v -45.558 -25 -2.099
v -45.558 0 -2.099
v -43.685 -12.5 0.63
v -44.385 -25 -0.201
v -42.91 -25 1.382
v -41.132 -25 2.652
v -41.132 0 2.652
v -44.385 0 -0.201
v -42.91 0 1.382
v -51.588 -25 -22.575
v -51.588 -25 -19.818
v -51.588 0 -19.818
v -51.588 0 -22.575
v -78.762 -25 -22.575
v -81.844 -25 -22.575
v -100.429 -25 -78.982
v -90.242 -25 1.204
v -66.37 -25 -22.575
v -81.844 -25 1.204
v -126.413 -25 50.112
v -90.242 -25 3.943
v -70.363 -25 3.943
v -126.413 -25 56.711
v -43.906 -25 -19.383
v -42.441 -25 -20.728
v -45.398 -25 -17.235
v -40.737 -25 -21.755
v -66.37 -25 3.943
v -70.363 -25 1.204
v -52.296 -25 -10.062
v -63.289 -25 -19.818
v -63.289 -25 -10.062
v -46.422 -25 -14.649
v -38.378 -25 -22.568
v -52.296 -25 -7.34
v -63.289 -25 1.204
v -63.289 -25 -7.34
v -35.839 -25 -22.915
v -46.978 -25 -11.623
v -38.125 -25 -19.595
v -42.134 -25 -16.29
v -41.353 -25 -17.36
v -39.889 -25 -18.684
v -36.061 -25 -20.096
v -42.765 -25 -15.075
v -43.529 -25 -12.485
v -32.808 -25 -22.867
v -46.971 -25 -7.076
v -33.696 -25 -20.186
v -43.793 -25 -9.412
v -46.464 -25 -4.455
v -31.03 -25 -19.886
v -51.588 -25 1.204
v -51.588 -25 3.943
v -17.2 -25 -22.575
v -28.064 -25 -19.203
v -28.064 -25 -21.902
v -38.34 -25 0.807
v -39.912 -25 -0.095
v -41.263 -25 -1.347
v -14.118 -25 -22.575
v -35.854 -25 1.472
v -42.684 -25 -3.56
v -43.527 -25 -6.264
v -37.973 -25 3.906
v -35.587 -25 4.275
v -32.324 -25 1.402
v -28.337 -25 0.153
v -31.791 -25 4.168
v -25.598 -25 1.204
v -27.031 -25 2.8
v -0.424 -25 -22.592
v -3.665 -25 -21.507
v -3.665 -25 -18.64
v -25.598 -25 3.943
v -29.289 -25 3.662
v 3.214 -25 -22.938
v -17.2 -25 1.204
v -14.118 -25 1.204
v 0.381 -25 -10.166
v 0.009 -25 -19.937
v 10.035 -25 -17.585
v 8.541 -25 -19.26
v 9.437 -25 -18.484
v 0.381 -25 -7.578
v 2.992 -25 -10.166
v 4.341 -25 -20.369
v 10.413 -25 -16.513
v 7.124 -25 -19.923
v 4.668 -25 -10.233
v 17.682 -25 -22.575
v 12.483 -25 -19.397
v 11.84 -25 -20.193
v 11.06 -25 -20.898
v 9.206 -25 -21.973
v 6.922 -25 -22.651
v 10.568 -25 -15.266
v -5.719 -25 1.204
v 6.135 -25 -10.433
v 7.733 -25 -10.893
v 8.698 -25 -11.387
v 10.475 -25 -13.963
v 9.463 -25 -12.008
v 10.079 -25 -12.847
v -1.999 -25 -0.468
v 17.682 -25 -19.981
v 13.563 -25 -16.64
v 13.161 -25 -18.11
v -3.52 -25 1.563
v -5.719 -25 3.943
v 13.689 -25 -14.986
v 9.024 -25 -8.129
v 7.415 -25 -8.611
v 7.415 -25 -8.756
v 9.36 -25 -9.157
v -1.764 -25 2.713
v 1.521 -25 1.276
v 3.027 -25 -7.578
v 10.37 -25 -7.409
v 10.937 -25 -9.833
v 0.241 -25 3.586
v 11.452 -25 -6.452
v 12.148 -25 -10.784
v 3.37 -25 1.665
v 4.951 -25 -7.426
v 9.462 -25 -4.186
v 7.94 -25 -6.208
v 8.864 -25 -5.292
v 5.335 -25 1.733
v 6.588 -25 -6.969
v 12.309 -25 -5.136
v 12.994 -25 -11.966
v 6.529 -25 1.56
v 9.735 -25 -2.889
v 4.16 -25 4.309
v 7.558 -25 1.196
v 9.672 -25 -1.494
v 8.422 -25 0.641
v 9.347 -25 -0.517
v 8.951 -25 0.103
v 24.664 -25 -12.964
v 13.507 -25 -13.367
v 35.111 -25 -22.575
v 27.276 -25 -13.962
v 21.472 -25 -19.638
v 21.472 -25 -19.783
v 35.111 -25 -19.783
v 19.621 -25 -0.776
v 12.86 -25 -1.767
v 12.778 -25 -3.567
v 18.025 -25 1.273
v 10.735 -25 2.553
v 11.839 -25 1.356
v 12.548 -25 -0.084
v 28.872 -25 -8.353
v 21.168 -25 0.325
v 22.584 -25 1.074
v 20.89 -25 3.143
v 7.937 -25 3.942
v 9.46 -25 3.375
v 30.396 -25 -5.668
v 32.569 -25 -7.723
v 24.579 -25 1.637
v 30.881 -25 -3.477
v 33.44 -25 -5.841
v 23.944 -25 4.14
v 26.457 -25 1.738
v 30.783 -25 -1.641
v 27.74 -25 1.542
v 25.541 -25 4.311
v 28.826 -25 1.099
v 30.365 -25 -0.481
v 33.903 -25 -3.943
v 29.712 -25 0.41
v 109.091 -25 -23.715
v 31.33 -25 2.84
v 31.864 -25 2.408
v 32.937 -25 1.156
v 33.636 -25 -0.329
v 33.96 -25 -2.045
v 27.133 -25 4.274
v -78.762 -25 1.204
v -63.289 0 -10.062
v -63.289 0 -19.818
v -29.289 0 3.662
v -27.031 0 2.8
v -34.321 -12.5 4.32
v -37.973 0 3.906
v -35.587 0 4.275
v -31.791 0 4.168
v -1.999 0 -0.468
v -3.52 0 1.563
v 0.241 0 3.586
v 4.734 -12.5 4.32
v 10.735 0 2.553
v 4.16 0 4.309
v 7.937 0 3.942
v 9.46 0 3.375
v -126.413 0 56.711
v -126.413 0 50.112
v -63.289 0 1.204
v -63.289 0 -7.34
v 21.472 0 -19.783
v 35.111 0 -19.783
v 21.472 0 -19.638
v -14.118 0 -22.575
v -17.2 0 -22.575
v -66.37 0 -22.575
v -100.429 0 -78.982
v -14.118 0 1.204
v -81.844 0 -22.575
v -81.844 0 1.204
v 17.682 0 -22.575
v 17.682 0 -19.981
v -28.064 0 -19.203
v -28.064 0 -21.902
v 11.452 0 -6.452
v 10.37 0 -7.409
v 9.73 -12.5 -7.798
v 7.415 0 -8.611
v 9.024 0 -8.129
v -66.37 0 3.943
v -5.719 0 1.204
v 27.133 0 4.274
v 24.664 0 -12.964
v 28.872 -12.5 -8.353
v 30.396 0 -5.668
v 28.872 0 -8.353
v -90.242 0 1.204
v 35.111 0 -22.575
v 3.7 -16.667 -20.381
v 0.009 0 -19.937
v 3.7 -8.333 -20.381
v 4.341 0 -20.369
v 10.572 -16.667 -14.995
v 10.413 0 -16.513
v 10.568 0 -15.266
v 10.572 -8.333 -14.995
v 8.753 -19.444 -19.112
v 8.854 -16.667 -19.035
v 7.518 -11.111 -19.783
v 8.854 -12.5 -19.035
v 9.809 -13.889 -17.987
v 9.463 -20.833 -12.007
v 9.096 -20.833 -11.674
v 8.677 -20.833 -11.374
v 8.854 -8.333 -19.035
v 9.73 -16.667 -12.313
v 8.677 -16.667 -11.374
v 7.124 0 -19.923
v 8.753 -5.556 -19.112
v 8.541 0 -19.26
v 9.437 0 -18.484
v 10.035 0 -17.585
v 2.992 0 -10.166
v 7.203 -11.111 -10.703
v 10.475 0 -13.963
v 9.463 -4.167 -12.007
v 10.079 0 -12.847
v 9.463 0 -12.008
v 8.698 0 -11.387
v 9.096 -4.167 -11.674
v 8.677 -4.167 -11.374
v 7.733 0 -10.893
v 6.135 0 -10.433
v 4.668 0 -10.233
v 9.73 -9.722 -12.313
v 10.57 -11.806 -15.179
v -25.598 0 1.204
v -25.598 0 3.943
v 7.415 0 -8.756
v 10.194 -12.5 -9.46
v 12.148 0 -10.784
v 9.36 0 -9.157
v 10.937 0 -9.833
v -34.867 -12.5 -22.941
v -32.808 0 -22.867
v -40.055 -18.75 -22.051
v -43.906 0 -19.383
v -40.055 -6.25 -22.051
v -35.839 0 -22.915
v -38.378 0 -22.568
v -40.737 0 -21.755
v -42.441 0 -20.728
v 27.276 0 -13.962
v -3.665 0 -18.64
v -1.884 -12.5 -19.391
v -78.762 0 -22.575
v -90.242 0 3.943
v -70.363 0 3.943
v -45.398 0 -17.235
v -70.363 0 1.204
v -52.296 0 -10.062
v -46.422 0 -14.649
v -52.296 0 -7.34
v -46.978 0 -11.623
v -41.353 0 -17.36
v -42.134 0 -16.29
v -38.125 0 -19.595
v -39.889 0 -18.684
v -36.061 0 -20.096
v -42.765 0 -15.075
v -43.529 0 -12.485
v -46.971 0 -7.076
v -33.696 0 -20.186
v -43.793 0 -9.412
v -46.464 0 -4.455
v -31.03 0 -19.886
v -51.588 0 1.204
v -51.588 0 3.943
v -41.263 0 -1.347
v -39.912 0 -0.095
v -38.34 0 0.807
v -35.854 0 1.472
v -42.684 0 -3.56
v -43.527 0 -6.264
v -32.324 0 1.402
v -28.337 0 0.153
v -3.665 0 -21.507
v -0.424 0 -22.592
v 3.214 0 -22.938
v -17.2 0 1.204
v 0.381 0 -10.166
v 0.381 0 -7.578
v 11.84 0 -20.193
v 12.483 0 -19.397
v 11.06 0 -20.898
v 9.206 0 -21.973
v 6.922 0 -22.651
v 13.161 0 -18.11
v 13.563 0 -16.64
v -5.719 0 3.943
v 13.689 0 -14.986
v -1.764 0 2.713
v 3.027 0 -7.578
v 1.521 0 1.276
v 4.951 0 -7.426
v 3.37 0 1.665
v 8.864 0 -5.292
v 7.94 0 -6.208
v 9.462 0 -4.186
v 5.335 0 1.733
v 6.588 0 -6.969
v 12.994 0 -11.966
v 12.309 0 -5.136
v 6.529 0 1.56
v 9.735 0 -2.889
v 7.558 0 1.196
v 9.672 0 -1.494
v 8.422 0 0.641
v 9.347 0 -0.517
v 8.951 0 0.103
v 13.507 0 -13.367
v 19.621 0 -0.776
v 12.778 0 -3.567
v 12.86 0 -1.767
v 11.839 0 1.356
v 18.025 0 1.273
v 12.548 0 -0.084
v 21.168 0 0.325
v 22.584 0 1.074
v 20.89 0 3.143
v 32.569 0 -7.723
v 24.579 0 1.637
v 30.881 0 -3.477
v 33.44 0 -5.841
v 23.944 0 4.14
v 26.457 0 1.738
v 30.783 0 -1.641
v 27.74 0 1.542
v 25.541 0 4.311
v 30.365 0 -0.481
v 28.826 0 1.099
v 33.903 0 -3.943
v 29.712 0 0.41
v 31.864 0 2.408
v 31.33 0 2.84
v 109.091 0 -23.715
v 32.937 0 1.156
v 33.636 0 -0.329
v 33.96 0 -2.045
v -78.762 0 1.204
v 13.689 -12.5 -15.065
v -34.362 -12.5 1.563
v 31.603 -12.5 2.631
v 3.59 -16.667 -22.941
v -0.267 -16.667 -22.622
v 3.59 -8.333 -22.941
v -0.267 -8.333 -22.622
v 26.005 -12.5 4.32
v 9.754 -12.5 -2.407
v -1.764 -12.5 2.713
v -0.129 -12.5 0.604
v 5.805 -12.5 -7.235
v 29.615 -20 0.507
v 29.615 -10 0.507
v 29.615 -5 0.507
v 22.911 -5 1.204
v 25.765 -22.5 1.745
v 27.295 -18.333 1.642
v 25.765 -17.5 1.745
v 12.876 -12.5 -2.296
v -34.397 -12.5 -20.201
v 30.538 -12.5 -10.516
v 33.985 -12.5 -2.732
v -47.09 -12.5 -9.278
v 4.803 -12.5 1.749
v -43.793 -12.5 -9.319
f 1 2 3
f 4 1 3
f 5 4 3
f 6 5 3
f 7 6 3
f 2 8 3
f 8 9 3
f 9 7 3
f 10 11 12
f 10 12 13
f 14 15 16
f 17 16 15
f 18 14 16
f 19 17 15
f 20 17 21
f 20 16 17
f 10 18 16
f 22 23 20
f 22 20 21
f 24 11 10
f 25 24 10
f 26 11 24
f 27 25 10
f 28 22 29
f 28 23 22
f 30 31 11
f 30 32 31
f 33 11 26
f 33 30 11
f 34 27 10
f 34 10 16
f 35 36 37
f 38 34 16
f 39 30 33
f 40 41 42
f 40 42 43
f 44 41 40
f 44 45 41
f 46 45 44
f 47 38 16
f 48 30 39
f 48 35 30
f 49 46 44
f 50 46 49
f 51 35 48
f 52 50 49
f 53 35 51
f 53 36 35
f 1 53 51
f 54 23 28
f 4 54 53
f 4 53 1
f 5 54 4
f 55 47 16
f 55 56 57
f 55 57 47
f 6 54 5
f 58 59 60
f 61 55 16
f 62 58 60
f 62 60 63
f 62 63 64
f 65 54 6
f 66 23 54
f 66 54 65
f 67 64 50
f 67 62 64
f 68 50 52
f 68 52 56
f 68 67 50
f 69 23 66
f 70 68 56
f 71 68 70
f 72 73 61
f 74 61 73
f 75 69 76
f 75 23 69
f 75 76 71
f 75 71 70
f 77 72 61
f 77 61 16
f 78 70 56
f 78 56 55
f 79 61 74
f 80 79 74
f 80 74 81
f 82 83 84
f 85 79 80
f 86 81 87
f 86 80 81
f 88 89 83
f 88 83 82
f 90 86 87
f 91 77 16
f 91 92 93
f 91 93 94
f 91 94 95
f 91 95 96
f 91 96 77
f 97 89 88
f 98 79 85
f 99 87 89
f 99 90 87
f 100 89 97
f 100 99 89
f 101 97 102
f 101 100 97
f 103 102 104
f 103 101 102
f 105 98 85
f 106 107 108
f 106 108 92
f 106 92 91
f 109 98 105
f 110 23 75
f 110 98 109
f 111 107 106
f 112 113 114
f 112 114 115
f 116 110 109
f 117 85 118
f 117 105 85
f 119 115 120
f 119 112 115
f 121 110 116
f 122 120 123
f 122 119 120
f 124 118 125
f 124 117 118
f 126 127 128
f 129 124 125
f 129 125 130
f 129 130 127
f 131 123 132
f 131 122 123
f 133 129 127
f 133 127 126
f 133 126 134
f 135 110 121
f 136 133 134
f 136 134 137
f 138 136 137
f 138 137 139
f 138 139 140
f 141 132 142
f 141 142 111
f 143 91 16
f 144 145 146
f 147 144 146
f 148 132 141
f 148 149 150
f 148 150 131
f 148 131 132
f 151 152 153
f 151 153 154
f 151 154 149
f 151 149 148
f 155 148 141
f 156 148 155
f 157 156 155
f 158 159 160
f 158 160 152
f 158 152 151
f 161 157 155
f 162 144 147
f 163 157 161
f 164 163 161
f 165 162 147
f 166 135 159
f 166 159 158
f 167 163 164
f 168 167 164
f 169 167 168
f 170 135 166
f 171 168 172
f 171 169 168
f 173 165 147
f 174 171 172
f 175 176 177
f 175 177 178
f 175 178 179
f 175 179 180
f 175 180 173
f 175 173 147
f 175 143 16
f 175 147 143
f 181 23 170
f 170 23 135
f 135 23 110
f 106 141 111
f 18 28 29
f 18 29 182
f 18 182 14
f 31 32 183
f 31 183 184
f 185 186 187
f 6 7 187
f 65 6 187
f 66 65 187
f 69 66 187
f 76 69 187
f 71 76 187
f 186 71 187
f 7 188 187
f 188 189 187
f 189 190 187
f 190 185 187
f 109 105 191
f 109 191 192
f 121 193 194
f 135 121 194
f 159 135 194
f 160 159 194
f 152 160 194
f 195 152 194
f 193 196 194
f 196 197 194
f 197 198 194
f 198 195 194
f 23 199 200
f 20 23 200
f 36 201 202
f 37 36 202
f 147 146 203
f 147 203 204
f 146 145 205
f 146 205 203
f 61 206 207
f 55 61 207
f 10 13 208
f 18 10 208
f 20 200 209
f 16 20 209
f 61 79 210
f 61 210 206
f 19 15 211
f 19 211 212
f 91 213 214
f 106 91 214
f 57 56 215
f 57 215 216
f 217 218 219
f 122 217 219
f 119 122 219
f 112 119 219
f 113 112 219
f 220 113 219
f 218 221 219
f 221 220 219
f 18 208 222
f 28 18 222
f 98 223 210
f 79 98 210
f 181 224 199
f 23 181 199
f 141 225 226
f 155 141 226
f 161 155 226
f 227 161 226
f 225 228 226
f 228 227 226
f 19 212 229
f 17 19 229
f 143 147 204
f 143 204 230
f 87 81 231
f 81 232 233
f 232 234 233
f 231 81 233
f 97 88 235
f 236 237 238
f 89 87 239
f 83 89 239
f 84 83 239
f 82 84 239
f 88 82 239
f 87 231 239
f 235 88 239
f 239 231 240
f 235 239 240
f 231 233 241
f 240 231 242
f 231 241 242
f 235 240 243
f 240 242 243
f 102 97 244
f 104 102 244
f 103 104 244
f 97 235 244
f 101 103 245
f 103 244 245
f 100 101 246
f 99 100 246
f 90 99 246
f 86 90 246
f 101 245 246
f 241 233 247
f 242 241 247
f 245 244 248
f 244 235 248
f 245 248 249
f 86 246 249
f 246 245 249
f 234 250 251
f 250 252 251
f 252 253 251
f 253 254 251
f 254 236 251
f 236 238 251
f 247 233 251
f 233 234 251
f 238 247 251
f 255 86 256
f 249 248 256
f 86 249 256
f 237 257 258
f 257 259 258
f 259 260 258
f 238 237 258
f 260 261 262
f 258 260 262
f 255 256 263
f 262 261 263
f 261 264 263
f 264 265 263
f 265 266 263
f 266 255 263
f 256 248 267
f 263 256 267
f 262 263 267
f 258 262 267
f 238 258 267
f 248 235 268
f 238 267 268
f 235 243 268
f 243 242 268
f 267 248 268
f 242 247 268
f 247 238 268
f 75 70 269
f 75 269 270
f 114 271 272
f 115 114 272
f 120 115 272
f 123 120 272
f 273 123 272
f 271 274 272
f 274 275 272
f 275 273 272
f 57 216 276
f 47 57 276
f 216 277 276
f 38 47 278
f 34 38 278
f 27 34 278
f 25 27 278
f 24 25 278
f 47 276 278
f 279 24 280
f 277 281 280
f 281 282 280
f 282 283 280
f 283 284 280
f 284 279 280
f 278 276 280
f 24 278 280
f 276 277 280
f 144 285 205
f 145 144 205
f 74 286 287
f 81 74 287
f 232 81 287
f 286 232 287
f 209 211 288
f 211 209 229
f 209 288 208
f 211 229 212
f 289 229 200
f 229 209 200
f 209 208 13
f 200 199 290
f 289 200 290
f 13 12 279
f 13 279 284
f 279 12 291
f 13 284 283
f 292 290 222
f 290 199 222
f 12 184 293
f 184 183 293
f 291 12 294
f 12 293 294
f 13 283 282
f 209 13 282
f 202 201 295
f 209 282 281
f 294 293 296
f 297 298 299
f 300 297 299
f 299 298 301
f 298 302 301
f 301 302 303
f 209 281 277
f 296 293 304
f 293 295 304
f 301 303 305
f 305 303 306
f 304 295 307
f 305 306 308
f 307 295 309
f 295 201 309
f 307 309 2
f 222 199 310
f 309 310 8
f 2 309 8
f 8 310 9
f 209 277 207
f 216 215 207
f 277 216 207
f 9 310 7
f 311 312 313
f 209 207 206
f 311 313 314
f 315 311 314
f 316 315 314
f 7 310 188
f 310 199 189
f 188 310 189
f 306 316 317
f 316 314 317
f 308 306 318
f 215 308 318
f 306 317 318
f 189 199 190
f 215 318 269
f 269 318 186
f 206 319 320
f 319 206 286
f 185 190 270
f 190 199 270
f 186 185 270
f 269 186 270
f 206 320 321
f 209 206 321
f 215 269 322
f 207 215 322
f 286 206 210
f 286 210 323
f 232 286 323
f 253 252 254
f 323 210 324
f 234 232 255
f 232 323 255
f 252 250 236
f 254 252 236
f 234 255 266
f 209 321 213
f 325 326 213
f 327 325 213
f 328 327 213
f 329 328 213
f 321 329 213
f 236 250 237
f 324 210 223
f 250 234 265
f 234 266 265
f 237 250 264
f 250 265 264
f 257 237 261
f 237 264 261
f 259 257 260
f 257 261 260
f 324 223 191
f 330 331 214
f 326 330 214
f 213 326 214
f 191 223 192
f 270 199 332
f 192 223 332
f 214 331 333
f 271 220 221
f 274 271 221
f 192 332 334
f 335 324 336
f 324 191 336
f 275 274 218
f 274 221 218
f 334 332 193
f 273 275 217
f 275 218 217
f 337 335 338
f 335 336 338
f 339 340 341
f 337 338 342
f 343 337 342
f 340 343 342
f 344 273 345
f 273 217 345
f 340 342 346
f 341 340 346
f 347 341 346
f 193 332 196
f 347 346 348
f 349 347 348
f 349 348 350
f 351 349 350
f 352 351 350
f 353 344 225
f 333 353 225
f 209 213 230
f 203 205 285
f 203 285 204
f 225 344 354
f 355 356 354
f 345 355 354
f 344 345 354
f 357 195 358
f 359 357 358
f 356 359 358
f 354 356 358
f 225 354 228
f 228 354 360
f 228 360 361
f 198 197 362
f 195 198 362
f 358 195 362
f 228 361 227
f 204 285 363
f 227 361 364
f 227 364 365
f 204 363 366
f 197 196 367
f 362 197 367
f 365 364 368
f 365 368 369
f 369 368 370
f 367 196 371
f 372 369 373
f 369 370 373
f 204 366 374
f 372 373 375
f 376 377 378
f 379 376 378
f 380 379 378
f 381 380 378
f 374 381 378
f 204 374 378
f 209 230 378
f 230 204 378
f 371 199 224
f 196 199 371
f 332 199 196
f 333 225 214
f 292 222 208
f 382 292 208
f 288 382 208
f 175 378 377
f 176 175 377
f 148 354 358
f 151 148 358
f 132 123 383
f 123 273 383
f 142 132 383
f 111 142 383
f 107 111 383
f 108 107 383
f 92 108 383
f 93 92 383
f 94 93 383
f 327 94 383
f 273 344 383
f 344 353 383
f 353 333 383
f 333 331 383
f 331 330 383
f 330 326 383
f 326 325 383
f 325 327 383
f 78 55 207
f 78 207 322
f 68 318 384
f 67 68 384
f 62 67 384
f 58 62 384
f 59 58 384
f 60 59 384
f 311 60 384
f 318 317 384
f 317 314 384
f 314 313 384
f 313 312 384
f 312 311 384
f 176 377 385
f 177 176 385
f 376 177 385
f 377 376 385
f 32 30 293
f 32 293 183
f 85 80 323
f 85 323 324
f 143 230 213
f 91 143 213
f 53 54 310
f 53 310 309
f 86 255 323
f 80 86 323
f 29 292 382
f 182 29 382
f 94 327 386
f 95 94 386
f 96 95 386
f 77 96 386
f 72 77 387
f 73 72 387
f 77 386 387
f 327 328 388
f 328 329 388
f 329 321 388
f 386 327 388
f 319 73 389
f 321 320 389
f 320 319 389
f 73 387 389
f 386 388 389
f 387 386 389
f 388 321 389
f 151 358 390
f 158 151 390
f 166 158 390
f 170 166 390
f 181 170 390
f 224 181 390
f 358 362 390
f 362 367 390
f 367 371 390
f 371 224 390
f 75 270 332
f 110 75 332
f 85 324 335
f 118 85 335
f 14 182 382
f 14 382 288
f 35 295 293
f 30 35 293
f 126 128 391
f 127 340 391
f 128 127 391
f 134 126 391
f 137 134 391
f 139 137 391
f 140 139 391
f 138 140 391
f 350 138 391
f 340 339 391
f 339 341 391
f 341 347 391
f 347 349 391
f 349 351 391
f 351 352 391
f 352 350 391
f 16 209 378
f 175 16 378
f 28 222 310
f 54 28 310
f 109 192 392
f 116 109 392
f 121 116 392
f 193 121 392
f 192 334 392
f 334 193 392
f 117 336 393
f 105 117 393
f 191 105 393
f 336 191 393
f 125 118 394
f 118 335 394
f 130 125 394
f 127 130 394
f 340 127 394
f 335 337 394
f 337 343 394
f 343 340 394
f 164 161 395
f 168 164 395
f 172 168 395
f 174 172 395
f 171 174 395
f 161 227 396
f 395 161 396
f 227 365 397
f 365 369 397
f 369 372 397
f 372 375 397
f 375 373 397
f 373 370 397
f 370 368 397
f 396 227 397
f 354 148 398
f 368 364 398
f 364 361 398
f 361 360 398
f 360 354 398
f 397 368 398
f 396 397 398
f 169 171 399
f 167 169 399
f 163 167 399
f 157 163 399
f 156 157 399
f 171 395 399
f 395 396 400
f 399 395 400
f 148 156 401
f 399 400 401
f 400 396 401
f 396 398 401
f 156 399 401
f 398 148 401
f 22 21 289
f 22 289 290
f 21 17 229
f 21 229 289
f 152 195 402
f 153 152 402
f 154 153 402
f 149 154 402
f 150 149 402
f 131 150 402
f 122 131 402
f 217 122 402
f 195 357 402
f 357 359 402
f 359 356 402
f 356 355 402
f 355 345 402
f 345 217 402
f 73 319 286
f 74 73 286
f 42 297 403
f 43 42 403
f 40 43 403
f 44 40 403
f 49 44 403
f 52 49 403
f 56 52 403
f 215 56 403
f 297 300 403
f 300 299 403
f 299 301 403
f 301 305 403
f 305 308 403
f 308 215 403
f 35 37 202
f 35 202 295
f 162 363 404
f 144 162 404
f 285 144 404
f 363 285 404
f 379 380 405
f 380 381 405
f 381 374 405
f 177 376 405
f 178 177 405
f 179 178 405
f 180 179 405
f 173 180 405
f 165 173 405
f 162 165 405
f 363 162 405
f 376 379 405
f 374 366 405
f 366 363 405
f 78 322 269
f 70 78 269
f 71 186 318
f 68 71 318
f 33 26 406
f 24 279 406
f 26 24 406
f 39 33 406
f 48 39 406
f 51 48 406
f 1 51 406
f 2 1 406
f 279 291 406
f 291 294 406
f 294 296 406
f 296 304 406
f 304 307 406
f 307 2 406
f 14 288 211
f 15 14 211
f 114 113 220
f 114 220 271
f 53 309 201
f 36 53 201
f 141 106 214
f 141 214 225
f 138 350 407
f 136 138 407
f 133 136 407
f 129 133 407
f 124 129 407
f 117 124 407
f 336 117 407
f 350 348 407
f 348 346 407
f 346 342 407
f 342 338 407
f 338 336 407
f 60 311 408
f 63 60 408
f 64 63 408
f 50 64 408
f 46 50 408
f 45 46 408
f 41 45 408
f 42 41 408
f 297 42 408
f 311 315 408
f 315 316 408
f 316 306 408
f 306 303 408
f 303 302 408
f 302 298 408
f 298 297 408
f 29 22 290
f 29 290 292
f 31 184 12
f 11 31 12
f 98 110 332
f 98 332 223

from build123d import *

# Parameters (mm, degrees)
F1_DEPTH = 25


with BuildPart() as f1:
    # F0 (on Front) → F1 (new body)
    with BuildSketch(Plane.XZ):
        with BuildLine():
            Line((27.1333980914, 4.2735439138), (-126.4131814241, 56.7106418312))
            Line((-126.4131814241, 56.7106418312), (-126.4131814241, 50.1115843654))
            Line((-126.4131814241, 50.1115843654), (-100.4294008017, -78.9824649692))
            Line((-100.4294008017, -78.9824649692), (109.0906560421, -23.7153619528))
            Line((109.0906560421, -23.7153619528), (31.3300916134, 2.8403473566))
            add(Edge.make_bspline(
                [(31.3300916134, 2.8403473566), (31.6087331931, 2.6379324169), (31.8639740687, 2.4078315454)],
                knots=[0.879679153, 0.879679153, 0.879679153, 1, 1, 1], degree=2))
            add(Edge.make_bspline(
                [(31.8639740687, 2.4078315454), (33.9853094976, 0.4954374993), (33.9853094976, -2.7315460807)],
                knots=[0, 0, 0, 1, 1, 1], degree=2))
            add(Edge.make_bspline(
                [(33.9853094976, -2.7315460807), (33.9853094976, -5.2562544572), (32.5691512359, -7.7229235606)],
                knots=[0, 0, 0, 1, 1, 1], degree=2))
            add(Edge.make_bspline(
                [(32.5691512359, -7.7229235606), (31.1529929742, -10.1895926641), (27.2759695363, -13.9621454105)],
                knots=[0, 0, 0, 1, 1, 1], degree=2))
            Line((27.2759695363, -13.9621454105), (21.4720422341, -19.6383863121))
            Line((21.4720422341, -19.6383863121), (21.4720422341, -19.7834844946))
            Line((21.4720422341, -19.7834844946), (35.1112713943, -19.7834844946))
            Line((35.1112713943, -19.7834844946), (35.1112713943, -22.575173527))
            Line((35.1112713943, -22.575173527), (17.6820777057, -22.575173527))
            Line((17.6820777057, -22.575173527), (17.6820777057, -19.9808180229))
            Line((17.6820777057, -19.9808180229), (24.6642022503, -12.9638699145))
            add(Edge.make_bspline(
                [(24.6642022503, -12.9638699145), (27.8563622665, -9.7310824072), (28.8720495444, -8.3526496729)],
                knots=[0, 0, 0, 1, 1, 1], degree=2))
            add(Edge.make_bspline(
                [(28.8720495444, -8.3526496729), (29.8877368223, -6.9742169386), (30.3955804612, -5.6683332956)],
                knots=[0, 0, 0, 1, 1, 1], degree=2))
            add(Edge.make_bspline(
                [(30.3955804612, -5.6683332956), (30.9034241002, -4.3624496526), (30.9034241002, -2.8592324814)],
                knots=[0, 0, 0, 1, 1, 1], degree=2))
            add(Edge.make_bspline(
                [(30.9034241002, -2.8592324814), (30.9034241002, -0.7349950888), (29.6149522391, 0.5070453539)],
                knots=[0, 0, 0, 1, 1, 1], degree=2))
            add(Edge.make_bspline(
                [(29.6149522391, 0.5070453539), (28.326480378, 1.7490857966), (26.0397330209, 1.7490857966)],
                knots=[0, 0, 0, 1, 1, 1], degree=2))
            add(Edge.make_bspline(
                [(26.0397330209, 1.7490857966), (24.3914176671, 1.7490857966), (22.911416205, 1.2035166302)],
                knots=[0, 0, 0, 1, 1, 1], degree=2))
            add(Edge.make_bspline(
                [(22.911416205, 1.2035166302), (21.4314147429, 0.6579474638), (19.6205894247, -0.7756225799)],
                knots=[0, 0, 0, 1, 1, 1], degree=2))
            Line((19.6205894247, -0.7756225799), (18.0245094165, 1.2731637578))
            add(Edge.make_bspline(
                [(18.0245094165, 1.2731637578), (21.6867875442, 4.3202255915), (26.0049094571, 4.3202255915)],
                knots=[0, 0, 0, 1, 1, 1], degree=2))
            add(Edge.make_bspline(
                [(26.0049094571, 4.3202255915), (26.5888819187, 4.3202255915), (27.1333980914, 4.2735439138)],
                knots=[0, 0, 0, 0.156237232, 0.156237232, 0.156237232], degree=2))
        make_face()
        Polygon((-78.7617822753, 1.2035166302), (-78.7617822753, -22.575173527), (-81.8436676727, -22.575173527), (-81.8436676727, 1.2035166302), (-90.241950479, 1.2035166302), (-90.241950479, 3.9429703168), (-70.3634994689, 3.9429703168), (-70.3634994689, 1.2035166302), align=None, mode=Mode.SUBTRACT)
        Polygon((-51.5877946463, -19.8183080584), (-51.5877946463, -22.575173527), (-66.370397485, -22.575173527), (-66.370397485, 3.9429703168), (-51.5877946463, 3.9429703168), (-51.5877946463, 1.2035166302), (-63.2885120875, 1.2035166302), (-63.2885120875, -7.3398643587), (-52.2958737771, -7.3398643587), (-52.2958737771, -10.0619062634), (-63.2885120875, -10.0619062634), (-63.2885120875, -19.8183080584), align=None, mode=Mode.SUBTRACT)
        with BuildLine():
            add(Edge.make_bspline(
                [(-28.3372618736, 0.1530057885), (-31.3495001434, 1.5633601229), (-34.3617384133, 1.5633601229)],
                knots=[0, 0, 0, 1, 1, 1], degree=2))
            add(Edge.make_bspline(
                [(-34.3617384133, 1.5633601229), (-38.7320956719, 1.5633601229), (-41.2626079756, -1.3473094191)],
                knots=[0, 0, 0, 1, 1, 1], degree=2))
            add(Edge.make_bspline(
                [(-41.2626079756, -1.3473094191), (-43.7931202794, -4.2579789612), (-43.7931202794, -9.3190035687)],
                knots=[0, 0, 0, 1, 1, 1], degree=2))
            add(Edge.make_bspline(
                [(-43.7931202794, -9.3190035687), (-43.7931202794, -14.5193224315), (-41.3525688488, -17.360344846)],
                knots=[0, 0, 0, 1, 1, 1], degree=2))
            add(Edge.make_bspline(
                [(-41.3525688488, -17.360344846), (-38.9120174182, -20.2013672604), (-34.3965619771, -20.2013672604)],
                knots=[0, 0, 0, 1, 1, 1], degree=2))
            add(Edge.make_bspline(
                [(-34.3965619771, -20.2013672604), (-31.6222847266, -20.2013672604), (-28.0644772904, -19.2030917644)],
                knots=[0, 0, 0, 1, 1, 1], degree=2))
            Line((-28.0644772904, -19.2030917644), (-28.0644772904, -21.9019179599))
            add(Edge.make_bspline(
                [(-28.0644772904, -21.9019179599), (-30.8213427589, -22.940820947), (-34.8666800886, -22.940820947)],
                knots=[0, 0, 0, 1, 1, 1], degree=2))
            add(Edge.make_bspline(
                [(-34.8666800886, -22.940820947), (-40.7228427365, -22.940820947), (-43.9062968618, -19.3830135108)],
                knots=[0, 0, 0, 1, 1, 1], degree=2))
            add(Edge.make_bspline(
                [(-43.9062968618, -19.3830135108), (-47.089750987, -15.8252060745), (-47.089750987, -9.2783760776)],
                knots=[0, 0, 0, 1, 1, 1], degree=2))
            add(Edge.make_bspline(
                [(-47.089750987, -9.2783760776), (-47.089750987, -5.1808034023), (-45.5575141793, -2.0989180048)],
                knots=[0, 0, 0, 1, 1, 1], degree=2))
            add(Edge.make_bspline(
                [(-45.5575141793, -2.0989180048), (-44.0252773715, 0.9829673927), (-41.1320196113, 2.6515964921)],
                knots=[0, 0, 0, 1, 1, 1], degree=2))
            add(Edge.make_bspline(
                [(-41.1320196113, 2.6515964921), (-38.2387618512, 4.3202255915), (-34.3211109222, 4.3202255915)],
                knots=[0, 0, 0, 1, 1, 1], degree=2))
            add(Edge.make_bspline(
                [(-34.3211109222, 4.3202255915), (-30.1538911192, 4.3202255915), (-27.0313782306, 2.7995966383)],
                knots=[0, 0, 0, 1, 1, 1], degree=2))
            Line((-27.0313782306, 2.7995966383), (-28.3372618736, 0.1530057885))
        make_face(mode=Mode.SUBTRACT)
        Polygon((-14.1176399831, 1.2035166302), (-14.1176399831, -22.575173527), (-17.1995253806, -22.575173527), (-17.1995253806, 1.2035166302), (-25.5978081869, 1.2035166302), (-25.5978081869, 3.9429703168), (-5.7193571768, 3.9429703168), (-5.7193571768, 1.2035166302), align=None, mode=Mode.SUBTRACT)
        with BuildLine():
            add(Edge.make_bspline(
                [(10.734776725, 2.552929728), (12.8764258995, 0.7856338644), (12.8764258995, -2.2962515331)],
                knots=[0, 0, 0, 1, 1, 1], degree=2))
            add(Edge.make_bspline(
                [(12.8764258995, -2.2962515331), (12.8764258995, -4.8383716914), (11.4515617468, -6.4518634814)],
                knots=[0, 0, 0, 1, 1, 1], degree=2))
            add(Edge.make_bspline(
                [(11.4515617468, -6.4518634814), (10.0266975941, -8.0653552715), (7.4149303081, -8.6109244379)],
                knots=[0, 0, 0, 1, 1, 1], degree=2))
            Line((7.4149303081, -8.6109244379), (7.4149303081, -8.7560226204))
            add(Edge.make_bspline(
                [(7.4149303081, -8.7560226204), (10.6070903243, -9.150689677), (12.148033023, -10.7844952125)],
                knots=[0, 0, 0, 1, 1, 1], degree=2))
            add(Edge.make_bspline(
                [(12.148033023, -10.7844952125), (13.6889757218, -12.4183007481), (13.6889757218, -15.0648915979)],
                knots=[0, 0, 0, 1, 1, 1], degree=2))
            add(Edge.make_bspline(
                [(13.6889757218, -15.0648915979), (13.6889757218, -18.8548561263), (11.0597966539, -20.8978385367)],
                knots=[0, 0, 0, 1, 1, 1], degree=2))
            add(Edge.make_bspline(
                [(11.0597966539, -20.8978385367), (8.430617586, -22.940820947), (3.5901422159, -22.940820947)],
                knots=[0, 0, 0, 1, 1, 1], degree=2))
            add(Edge.make_bspline(
                [(3.5901422159, -22.940820947), (1.4833166052, -22.940820947), (-0.2665674764, -22.6216049454)],
                knots=[0, 0, 0, 1, 1, 1], degree=2))
            add(Edge.make_bspline(
                [(-0.2665674764, -22.6216049454), (-2.016451558, -22.3023889438), (-3.6647669118, -21.5072509034)],
                knots=[0, 0, 0, 1, 1, 1], degree=2))
            Line((-3.6647669118, -21.5072509034), (-3.6647669118, -18.6401108161))
            add(Edge.make_bspline(
                [(-3.6647669118, -18.6401108161), (-1.9410005031, -19.4932881295), (0.0091190705, -19.9372885681)],
                knots=[0, 0, 0, 1, 1, 1], degree=2))
            add(Edge.make_bspline(
                [(0.0091190705, -19.9372885681), (1.959238644, -20.3812890068), (3.7004168347, -20.3812890068)],
                knots=[0, 0, 0, 1, 1, 1], degree=2))
            add(Edge.make_bspline(
                [(3.7004168347, -20.3812890068), (10.5722667605, -20.3812890068), (10.5722667605, -14.9952444703)],
                knots=[0, 0, 0, 1, 1, 1], degree=2))
            add(Edge.make_bspline(
                [(10.5722667605, -14.9952444703), (10.5722667605, -10.1663769549), (2.9923377038, -10.1663769549)],
                knots=[0, 0, 0, 1, 1, 1], degree=2))
            Line((2.9923377038, -10.1663769549), (0.3805704178, -10.1663769549))
            Line((0.3805704178, -10.1663769549), (0.3805704178, -7.5778253781))
            Line((0.3805704178, -7.5778253781), (3.0271612676, -7.5778253781))
            add(Edge.make_bspline(
                [(3.0271612676, -7.5778253781), (6.126458447, -7.5778253781), (7.9401857289, -6.2080985347)],
                knots=[0, 0, 0, 1, 1, 1], degree=2))
            add(Edge.make_bspline(
                [(7.9401857289, -6.2080985347), (9.7539130109, -4.8383716914), (9.7539130109, -2.4065261518)],
                knots=[0, 0, 0, 1, 1, 1], degree=2))
            add(Edge.make_bspline(
                [(9.7539130109, -2.4065261518), (9.7539130109, -0.4680144329), (8.421911695, 0.6405356819)],
                knots=[0, 0, 0, 1, 1, 1], degree=2))
            add(Edge.make_bspline(
                [(8.421911695, 0.6405356819), (7.0899103792, 1.7490857966), (4.8031630221, 1.7490857966)],
                knots=[0, 0, 0, 1, 1, 1], degree=2))
            add(Edge.make_bspline(
                [(4.8031630221, 1.7490857966), (3.0619848314, 1.7490857966), (1.5210421327, 1.2760657215)],
                knots=[0, 0, 0, 1, 1, 1], degree=2))
            add(Edge.make_bspline(
                [(1.5210421327, 1.2760657215), (-0.0199005661, 0.8030456463), (-1.9990397761, -0.4680144329)],
                knots=[0, 0, 0, 1, 1, 1], degree=2))
            Line((-1.9990397761, -0.4680144329), (-3.5196687293, 1.5633601229))
            add(Edge.make_bspline(
                [(-3.5196687293, 1.5633601229), (-1.8887651574, 2.851831984), (0.2412761625, 3.5860287877)],
                knots=[0, 0, 0, 1, 1, 1], degree=2))
            add(Edge.make_bspline(
                [(0.2412761625, 3.5860287877), (2.3713174825, 4.3202255915), (4.7335158945, 4.3202255915)],
                knots=[0, 0, 0, 1, 1, 1], degree=2))
            add(Edge.make_bspline(
                [(4.7335158945, 4.3202255915), (8.5931275504, 4.3202255915), (10.734776725, 2.552929728)],
                knots=[0, 0, 0, 1, 1, 1], degree=2))
        make_face(mode=Mode.SUBTRACT)
    extrude(amount=F1_DEPTH)


solid = f1.part
